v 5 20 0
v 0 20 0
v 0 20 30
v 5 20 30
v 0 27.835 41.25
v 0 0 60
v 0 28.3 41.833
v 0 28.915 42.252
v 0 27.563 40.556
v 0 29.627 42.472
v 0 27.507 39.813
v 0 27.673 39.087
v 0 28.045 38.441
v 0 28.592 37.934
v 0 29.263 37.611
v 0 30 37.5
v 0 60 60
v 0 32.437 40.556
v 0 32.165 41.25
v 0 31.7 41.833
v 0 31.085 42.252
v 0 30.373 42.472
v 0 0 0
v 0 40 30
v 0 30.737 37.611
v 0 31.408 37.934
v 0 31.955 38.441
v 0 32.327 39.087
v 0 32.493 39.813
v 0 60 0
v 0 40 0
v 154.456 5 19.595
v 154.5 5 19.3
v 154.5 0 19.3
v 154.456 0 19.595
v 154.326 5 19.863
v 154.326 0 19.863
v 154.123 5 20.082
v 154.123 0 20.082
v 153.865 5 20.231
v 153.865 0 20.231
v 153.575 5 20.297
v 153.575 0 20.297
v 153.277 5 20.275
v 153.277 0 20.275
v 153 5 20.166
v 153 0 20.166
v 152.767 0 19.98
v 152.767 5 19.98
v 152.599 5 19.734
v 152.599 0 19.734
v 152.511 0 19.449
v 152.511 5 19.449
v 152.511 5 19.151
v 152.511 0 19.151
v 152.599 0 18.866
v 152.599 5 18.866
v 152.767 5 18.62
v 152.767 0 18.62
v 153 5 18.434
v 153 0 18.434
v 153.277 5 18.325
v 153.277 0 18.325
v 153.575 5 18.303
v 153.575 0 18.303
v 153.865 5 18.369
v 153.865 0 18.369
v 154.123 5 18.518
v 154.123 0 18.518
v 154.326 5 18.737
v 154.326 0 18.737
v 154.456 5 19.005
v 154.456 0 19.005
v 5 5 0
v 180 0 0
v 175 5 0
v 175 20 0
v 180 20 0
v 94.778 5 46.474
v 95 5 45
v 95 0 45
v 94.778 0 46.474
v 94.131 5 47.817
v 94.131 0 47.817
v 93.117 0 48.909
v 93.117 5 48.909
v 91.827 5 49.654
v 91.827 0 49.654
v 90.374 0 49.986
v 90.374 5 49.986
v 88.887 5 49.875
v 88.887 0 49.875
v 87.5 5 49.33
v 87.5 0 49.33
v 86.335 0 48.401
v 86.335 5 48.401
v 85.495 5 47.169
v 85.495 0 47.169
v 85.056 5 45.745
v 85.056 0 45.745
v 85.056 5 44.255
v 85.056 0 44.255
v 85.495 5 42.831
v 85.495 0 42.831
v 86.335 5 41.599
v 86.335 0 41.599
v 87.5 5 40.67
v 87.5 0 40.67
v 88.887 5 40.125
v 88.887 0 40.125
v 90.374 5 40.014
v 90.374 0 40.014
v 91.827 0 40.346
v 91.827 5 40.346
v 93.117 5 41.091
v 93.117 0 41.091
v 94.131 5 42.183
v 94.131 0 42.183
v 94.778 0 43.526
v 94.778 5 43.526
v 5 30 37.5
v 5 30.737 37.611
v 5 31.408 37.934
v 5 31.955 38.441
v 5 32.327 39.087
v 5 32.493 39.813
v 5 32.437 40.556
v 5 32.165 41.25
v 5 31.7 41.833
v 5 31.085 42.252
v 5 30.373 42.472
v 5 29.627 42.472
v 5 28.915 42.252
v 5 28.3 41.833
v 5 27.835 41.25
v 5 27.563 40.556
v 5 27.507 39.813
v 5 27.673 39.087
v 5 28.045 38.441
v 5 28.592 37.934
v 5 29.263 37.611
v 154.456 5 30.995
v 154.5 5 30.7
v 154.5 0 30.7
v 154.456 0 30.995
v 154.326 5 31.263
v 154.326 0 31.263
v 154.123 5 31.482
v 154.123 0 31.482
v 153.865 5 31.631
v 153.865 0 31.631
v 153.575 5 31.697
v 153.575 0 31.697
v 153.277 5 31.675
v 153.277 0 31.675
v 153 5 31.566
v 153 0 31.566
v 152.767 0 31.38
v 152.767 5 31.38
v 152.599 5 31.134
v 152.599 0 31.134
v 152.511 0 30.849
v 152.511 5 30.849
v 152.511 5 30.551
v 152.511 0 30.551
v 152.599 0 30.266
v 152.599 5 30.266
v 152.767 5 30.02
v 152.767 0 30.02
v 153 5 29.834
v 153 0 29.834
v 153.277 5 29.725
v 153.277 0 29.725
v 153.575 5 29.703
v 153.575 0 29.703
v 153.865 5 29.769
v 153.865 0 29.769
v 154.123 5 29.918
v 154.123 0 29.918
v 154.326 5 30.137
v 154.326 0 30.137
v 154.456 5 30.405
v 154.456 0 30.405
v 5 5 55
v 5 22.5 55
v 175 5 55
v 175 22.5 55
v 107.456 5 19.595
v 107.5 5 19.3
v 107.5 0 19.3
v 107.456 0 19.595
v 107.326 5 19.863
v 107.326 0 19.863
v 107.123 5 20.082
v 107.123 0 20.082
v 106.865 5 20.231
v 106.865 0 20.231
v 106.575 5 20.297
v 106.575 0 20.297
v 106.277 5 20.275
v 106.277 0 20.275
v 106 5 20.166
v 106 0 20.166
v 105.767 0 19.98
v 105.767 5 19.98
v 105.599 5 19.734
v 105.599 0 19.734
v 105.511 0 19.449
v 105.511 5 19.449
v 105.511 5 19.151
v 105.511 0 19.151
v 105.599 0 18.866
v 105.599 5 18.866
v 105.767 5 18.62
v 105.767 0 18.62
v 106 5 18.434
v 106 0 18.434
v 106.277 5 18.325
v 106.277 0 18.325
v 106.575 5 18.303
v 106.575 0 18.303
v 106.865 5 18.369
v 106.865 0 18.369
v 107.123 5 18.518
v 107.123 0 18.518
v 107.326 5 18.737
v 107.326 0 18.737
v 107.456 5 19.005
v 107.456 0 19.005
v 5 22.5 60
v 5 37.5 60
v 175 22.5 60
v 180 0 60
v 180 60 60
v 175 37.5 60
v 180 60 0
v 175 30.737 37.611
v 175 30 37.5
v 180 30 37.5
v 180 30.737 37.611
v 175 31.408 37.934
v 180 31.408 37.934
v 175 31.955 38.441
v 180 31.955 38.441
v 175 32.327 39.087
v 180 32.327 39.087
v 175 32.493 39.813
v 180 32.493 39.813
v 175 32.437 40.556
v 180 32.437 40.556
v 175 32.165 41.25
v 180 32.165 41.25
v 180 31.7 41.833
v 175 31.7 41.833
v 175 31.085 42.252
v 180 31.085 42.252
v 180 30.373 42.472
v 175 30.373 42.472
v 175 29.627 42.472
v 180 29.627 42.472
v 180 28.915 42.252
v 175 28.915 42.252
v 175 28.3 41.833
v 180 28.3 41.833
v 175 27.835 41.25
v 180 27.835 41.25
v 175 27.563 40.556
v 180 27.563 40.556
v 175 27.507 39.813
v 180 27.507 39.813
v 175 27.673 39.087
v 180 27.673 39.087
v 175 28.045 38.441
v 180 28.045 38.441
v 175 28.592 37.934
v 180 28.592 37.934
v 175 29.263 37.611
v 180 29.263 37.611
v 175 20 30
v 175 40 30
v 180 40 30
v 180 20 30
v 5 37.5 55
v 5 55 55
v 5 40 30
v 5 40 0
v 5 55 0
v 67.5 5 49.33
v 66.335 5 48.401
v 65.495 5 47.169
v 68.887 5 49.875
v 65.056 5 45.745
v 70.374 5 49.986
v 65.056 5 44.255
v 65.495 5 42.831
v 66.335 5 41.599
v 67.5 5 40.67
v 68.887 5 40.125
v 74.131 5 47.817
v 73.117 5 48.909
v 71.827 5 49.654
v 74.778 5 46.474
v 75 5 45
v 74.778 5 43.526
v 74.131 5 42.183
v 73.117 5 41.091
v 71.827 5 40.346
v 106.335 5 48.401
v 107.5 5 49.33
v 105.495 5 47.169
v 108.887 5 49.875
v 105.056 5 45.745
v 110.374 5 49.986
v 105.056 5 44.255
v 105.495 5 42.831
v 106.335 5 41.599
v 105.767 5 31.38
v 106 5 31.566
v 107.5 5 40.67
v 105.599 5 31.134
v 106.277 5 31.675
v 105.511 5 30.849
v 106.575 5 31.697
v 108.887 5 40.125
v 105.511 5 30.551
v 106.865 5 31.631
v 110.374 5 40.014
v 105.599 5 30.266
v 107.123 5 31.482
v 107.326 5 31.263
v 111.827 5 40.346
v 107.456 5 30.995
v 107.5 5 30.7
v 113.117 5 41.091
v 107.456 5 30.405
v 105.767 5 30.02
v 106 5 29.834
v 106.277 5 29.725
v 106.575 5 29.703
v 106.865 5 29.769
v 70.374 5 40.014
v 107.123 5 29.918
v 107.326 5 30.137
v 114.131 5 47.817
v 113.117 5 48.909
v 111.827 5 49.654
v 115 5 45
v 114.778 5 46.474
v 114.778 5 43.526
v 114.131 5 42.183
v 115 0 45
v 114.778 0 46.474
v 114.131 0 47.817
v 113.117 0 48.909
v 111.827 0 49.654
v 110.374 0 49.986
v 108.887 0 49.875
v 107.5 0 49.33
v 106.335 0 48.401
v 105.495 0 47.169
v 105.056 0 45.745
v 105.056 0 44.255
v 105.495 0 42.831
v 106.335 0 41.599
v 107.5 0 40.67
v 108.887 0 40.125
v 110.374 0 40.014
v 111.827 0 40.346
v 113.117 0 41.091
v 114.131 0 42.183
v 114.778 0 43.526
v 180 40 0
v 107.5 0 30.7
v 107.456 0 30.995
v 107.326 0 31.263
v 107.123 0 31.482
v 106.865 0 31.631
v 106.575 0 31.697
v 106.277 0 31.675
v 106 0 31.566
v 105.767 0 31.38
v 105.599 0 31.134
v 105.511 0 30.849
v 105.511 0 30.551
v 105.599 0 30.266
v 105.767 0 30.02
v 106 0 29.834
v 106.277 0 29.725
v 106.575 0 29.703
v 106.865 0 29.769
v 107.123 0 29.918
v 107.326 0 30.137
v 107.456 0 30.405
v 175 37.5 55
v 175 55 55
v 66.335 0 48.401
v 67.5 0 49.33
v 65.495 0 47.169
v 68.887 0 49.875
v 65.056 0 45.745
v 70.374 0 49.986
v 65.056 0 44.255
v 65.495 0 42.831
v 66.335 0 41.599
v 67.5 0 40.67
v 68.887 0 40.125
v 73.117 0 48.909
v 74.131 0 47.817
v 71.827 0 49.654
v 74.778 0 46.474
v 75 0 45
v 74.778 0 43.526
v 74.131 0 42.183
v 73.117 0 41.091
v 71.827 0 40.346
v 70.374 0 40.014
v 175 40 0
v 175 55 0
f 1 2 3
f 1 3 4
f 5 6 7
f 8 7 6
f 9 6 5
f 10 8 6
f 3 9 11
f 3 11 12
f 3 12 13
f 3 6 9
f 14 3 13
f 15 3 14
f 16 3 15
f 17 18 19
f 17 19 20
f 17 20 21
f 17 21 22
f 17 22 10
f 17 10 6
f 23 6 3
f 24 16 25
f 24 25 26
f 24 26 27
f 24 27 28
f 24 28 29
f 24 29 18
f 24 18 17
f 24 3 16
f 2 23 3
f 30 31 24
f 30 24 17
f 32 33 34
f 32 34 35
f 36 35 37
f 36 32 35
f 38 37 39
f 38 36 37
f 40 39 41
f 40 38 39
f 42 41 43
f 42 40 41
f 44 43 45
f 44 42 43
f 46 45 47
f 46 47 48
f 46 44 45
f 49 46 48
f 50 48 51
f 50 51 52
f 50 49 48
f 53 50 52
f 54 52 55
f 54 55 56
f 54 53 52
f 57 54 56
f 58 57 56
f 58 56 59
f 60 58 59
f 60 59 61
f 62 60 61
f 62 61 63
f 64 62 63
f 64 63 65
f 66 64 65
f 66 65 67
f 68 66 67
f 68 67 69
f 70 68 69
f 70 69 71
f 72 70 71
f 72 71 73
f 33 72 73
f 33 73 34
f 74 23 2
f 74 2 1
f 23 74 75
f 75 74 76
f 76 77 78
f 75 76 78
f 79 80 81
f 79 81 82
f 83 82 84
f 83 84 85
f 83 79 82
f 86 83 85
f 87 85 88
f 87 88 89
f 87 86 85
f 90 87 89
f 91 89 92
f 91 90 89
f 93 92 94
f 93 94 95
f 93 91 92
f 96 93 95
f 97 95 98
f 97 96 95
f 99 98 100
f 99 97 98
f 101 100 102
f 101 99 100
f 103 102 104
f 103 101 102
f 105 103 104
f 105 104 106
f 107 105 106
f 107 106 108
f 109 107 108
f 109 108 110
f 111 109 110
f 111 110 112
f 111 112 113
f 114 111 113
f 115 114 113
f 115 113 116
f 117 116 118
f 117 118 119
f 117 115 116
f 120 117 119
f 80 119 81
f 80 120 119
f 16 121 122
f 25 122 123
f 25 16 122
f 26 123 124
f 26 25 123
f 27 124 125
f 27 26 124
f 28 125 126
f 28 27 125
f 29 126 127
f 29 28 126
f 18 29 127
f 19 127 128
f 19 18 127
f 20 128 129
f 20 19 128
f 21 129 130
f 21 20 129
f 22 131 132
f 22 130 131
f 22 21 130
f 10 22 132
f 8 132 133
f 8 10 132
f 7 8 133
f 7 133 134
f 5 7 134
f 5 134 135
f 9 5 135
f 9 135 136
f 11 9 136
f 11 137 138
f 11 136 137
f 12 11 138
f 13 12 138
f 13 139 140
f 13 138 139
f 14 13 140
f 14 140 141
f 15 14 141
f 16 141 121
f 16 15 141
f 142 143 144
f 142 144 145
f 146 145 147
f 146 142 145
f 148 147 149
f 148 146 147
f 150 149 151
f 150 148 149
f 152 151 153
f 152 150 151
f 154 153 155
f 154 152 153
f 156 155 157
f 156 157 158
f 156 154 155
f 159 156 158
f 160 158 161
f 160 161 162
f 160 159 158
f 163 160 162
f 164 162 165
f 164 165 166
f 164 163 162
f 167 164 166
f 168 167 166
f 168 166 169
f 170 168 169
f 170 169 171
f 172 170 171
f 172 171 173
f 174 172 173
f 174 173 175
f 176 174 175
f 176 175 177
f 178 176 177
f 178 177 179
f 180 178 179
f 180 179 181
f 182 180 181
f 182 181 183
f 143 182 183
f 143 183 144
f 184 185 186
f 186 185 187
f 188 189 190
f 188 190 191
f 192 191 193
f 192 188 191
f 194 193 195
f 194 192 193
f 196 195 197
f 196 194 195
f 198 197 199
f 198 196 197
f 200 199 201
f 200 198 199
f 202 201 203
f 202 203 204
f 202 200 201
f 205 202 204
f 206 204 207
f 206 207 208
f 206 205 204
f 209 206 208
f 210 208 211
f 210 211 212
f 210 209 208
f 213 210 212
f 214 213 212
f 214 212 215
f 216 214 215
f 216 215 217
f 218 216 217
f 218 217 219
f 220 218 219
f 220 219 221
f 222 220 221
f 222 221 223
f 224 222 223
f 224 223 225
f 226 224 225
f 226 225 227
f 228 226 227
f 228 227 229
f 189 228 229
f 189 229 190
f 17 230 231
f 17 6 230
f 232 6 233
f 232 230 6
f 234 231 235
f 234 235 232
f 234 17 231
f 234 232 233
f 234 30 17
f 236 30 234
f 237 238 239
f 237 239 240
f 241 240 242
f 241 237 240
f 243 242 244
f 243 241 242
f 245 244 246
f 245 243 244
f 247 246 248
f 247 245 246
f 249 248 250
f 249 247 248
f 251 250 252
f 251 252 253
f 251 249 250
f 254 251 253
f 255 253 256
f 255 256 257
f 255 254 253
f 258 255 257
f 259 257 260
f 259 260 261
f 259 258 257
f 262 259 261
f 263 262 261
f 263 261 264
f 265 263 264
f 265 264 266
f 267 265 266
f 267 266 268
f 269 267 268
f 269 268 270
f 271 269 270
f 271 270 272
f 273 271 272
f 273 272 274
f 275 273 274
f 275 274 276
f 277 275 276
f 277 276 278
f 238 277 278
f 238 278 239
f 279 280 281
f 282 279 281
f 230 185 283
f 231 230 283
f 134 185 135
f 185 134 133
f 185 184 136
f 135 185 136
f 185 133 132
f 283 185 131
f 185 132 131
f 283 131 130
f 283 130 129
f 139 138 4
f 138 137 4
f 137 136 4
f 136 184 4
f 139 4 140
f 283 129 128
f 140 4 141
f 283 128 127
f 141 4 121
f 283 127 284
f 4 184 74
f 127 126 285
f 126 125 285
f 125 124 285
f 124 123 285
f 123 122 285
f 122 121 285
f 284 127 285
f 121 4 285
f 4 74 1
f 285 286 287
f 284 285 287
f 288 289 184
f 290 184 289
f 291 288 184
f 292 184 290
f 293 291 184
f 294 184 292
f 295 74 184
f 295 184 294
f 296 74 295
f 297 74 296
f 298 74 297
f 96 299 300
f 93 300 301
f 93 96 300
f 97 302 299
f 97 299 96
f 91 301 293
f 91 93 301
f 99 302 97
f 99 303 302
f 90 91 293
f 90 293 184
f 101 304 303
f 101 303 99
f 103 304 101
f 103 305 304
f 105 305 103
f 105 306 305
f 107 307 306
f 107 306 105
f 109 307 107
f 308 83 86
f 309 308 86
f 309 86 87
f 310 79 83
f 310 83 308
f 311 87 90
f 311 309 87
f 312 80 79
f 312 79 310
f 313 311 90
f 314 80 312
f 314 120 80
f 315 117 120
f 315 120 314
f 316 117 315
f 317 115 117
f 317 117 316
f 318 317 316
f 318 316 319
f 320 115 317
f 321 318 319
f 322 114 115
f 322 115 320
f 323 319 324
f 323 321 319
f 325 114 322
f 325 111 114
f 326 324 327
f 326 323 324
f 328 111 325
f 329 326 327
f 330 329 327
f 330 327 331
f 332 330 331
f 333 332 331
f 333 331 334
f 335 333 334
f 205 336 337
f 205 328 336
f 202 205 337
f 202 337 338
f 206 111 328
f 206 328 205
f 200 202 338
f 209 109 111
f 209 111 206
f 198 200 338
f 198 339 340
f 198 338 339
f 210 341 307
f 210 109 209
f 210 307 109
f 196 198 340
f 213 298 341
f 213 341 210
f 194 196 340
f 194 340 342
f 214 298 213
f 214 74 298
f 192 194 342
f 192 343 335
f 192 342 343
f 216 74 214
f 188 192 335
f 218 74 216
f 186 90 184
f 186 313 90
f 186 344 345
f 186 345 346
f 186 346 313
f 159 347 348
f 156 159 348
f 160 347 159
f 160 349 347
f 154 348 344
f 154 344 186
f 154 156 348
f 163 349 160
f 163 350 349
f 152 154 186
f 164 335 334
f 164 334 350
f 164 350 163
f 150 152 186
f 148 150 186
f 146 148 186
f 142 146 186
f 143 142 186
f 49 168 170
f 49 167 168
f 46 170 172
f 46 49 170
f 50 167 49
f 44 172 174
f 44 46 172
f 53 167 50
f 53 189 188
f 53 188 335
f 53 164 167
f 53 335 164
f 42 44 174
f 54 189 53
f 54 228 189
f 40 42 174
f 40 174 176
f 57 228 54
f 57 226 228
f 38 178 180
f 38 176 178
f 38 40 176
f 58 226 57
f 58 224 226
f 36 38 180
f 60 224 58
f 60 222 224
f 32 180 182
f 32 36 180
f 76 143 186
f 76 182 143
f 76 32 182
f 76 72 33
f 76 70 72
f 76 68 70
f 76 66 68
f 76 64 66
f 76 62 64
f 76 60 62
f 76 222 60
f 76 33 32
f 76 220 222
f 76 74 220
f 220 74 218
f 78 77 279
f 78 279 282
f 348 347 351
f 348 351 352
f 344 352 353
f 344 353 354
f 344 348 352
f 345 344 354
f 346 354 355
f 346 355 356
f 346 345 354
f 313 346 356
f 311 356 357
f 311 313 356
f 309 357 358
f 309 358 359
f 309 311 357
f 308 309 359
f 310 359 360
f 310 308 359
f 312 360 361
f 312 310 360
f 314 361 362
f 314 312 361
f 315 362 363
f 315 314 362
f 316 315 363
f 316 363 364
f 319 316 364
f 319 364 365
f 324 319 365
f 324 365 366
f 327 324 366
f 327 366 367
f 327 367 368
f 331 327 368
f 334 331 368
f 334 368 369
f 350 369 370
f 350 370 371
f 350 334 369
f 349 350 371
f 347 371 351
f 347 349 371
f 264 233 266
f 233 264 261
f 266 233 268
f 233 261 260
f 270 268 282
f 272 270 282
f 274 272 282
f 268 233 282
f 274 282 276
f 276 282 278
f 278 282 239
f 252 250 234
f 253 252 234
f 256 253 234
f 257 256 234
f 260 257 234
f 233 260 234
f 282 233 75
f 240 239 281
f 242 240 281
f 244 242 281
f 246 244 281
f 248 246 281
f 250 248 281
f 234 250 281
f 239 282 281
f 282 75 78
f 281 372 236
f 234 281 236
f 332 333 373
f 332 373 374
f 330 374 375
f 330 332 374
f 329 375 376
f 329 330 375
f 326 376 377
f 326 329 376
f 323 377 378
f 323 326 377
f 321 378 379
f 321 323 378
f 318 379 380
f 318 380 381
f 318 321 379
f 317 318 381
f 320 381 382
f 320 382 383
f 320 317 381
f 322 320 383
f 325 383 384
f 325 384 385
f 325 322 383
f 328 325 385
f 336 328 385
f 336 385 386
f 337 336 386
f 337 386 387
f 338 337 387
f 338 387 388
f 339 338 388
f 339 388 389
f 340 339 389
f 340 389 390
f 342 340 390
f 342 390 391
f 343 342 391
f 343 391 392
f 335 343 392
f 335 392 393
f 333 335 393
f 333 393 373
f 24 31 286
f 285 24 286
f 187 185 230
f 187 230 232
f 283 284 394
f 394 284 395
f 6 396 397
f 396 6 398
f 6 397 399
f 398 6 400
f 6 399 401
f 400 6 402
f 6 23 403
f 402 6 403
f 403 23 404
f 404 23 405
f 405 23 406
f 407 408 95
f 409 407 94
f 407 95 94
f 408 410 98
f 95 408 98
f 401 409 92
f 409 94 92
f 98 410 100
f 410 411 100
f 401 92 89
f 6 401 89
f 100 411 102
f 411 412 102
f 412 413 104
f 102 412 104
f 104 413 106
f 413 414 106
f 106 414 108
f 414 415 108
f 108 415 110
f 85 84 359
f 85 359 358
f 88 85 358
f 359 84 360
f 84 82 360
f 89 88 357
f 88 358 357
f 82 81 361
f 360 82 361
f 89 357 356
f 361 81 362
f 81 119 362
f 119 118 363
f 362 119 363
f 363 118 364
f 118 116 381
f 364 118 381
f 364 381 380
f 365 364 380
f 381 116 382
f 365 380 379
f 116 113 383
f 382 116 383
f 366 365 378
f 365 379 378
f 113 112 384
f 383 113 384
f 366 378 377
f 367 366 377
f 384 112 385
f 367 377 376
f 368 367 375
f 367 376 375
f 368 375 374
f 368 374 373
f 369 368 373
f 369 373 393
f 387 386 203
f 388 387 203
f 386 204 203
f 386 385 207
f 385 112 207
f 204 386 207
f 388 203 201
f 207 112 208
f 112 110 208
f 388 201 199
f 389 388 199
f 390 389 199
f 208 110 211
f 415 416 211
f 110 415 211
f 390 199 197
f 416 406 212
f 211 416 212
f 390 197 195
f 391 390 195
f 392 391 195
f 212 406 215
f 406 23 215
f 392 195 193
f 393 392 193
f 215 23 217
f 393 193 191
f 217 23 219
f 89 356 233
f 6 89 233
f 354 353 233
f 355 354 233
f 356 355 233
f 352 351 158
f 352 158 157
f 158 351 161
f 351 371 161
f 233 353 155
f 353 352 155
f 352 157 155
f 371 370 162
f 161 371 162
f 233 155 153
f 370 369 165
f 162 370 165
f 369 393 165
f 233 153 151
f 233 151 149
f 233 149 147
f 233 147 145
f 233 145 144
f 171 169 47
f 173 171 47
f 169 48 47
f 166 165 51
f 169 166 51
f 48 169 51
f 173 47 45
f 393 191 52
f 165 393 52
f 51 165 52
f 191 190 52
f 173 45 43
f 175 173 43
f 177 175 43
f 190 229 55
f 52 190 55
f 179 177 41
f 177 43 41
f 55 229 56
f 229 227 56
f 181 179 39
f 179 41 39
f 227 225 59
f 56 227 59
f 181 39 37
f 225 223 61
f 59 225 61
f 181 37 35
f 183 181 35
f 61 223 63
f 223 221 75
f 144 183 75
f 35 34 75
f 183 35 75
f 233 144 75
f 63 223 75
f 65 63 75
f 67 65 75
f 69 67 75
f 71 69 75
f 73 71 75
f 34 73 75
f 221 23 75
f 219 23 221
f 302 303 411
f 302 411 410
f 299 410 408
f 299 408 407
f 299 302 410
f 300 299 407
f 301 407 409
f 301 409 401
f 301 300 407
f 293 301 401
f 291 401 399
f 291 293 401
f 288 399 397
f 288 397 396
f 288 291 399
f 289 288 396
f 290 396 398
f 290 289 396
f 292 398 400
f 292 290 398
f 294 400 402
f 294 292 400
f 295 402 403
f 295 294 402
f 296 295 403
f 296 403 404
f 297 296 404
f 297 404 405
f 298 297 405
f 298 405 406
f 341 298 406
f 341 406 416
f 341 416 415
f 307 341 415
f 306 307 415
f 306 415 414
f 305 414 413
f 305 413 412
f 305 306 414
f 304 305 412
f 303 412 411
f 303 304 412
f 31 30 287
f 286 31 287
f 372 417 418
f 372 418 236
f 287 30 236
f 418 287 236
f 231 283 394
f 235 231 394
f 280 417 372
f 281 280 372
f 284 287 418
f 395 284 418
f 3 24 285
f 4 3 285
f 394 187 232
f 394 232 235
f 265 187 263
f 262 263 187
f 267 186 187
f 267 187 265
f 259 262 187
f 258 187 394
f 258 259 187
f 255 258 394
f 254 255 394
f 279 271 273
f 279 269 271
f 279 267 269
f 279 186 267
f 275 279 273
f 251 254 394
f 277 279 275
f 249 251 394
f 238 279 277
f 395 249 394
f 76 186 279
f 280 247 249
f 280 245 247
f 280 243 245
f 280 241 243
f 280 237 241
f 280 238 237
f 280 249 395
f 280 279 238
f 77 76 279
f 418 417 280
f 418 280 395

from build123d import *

# Parameters (mm, degrees)
CYLINDER010_R     = 5
CYLINDER010_DEPTH = 5
CYLINDER009_R     = 5
CYLINDER009_DEPTH = 5
CYLINDER008_R     = 5
CYLINDER008_DEPTH = 5
CYLINDER005_R     = 1
CYLINDER005_DEPTH = 13
CYLINDER006_R     = 1
CYLINDER006_DEPTH = 13
CYLINDER007_R     = 1
CYLINDER007_DEPTH = 13
CYLINDER004_R     = 1
CYLINDER004_DEPTH = 13
CYLINDER_R        = 2.5
CYLINDER_DEPTH    = 180
BOX003_W          = 170
BOX003_H          = 15
BOX003_DEPTH      = 5
BOX002_W          = 180
BOX002_H          = 20
BOX002_DEPTH      = 30
BOX_W             = 170
BOX_H             = 50
BOX_DEPTH         = 55
BOX001_W          = 180
BOX001_H          = 60
BOX001_DEPTH      = 60


with BuildPart() as led3:
    # Cylinder010 → Cylinder010 (new body)
    with BuildSketch(Plane(origin=(110, 5, 45), x_dir=(1, 0, 0), z_dir=(0, -1, 0))):
        Circle(CYLINDER010_R)
    extrude(amount=CYLINDER010_DEPTH)


with BuildPart() as led2:
    # Cylinder009 → Cylinder009 (new body)
    with BuildSketch(Plane(origin=(70, 5, 45), x_dir=(1, 0, 0), z_dir=(0, -1, 0))):
        Circle(CYLINDER009_R)
    extrude(amount=CYLINDER009_DEPTH)


with BuildPart() as leds:
    # Cylinder008 → Cylinder008 (new body)
    with BuildSketch(Plane(origin=(90, 5, 45), x_dir=(1, 0, 0), z_dir=(0, -1, 0))):
        Circle(CYLINDER008_R)
    extrude(amount=CYLINDER008_DEPTH)

    # Fusion002: union LED3, LED2
    add(led3.part)
    add(led2.part)


with BuildPart() as topleft:
    # Cylinder005 → Cylinder005 (new body)
    with BuildSketch(Plane(origin=(106.5, 14, 30.7), x_dir=(1, 0, 0), z_dir=(0, -1, 0))):
        Circle(CYLINDER005_R)
    extrude(amount=CYLINDER005_DEPTH)


with BuildPart() as bottomright:
    # Cylinder006 → Cylinder006 (new body)
    with BuildSketch(Plane(origin=(153.5, 14, 19.3), x_dir=(1, 0, 0), z_dir=(0, -1, 0))):
        Circle(CYLINDER006_R)
    extrude(amount=CYLINDER006_DEPTH)


with BuildPart() as bottomleft:
    # Cylinder007 → Cylinder007 (new body)
    with BuildSketch(Plane(origin=(153.5, 14, 30.7), x_dir=(1, 0, 0), z_dir=(0, -1, 0))):
        Circle(CYLINDER007_R)
    extrude(amount=CYLINDER007_DEPTH)


with BuildPart() as fusion001:
    # Cylinder004 → Cylinder004 (new body)
    with BuildSketch(Plane(origin=(106.5, 14, 19.3), x_dir=(1, 0, 0), z_dir=(0, -1, 0))):
        Circle(CYLINDER004_R)
    extrude(amount=CYLINDER004_DEPTH)

    # Fusion001: union TopLeft, BottomRight, BottomLeft
    add(topleft.part)
    add(bottomright.part)
    add(bottomleft.part)


with BuildPart() as fusion001_1:
    # Fusion001 placement: moved
    add(fusion001.part.moved(Location((0, -1, 0))))


with BuildPart() as cylinder:
    # Cylinder → Cylinder (new body)
    with BuildSketch(Plane(origin=(0, 30, 40), x_dir=(0, 0, -1), z_dir=(1, 0, 0))):
        Circle(CYLINDER_R)
    extrude(amount=CYLINDER_DEPTH)


with BuildPart() as cube003:
    # Box003 → Box003 (new body)
    with BuildSketch(Plane(origin=(5, 22.5, 55), x_dir=(1, 0, 0), z_dir=(0, 0, 1))):
        with Locations((85, 7.5)):
            Rectangle(BOX003_W, BOX003_H)
    extrude(amount=BOX003_DEPTH)


with BuildPart() as cube002:
    # Box002 → Box002 (new body)
    with BuildSketch(Plane(origin=(0, 20, 0), x_dir=(1, 0, 0), z_dir=(0, 0, 1))):
        with Locations((90, 10)):
            Rectangle(BOX002_W, BOX002_H)
    extrude(amount=BOX002_DEPTH)


with BuildPart() as cube:
    # Box → Box (new body)
    with BuildSketch(Plane(origin=(5, 5, 0), x_dir=(1, 0, 0), z_dir=(0, 0, 1))):
        with Locations((85, 25)):
            Rectangle(BOX_W, BOX_H)
    extrude(amount=BOX_DEPTH)


with BuildPart() as cut007:
    # Box001 → Box001 (new body)
    with BuildSketch(Plane.XY):
        with Locations((90, 30)):
            Rectangle(BOX001_W, BOX001_H)
    extrude(amount=BOX001_DEPTH)

    # Cut: cut Cube
    add(cube.part, mode=Mode.SUBTRACT)

    # Cut001: cut Cube002
    add(cube002.part, mode=Mode.SUBTRACT)

    # Cut002: cut Cube003
    add(cube003.part, mode=Mode.SUBTRACT)

    # Cut003: cut Cylinder
    add(cylinder.part, mode=Mode.SUBTRACT)

    # Cut006: cut Fusion001
    add(fusion001_1.part, mode=Mode.SUBTRACT)

    # Cut007: cut LEDs
    add(leds.part, mode=Mode.SUBTRACT)


solid = cut007.part
